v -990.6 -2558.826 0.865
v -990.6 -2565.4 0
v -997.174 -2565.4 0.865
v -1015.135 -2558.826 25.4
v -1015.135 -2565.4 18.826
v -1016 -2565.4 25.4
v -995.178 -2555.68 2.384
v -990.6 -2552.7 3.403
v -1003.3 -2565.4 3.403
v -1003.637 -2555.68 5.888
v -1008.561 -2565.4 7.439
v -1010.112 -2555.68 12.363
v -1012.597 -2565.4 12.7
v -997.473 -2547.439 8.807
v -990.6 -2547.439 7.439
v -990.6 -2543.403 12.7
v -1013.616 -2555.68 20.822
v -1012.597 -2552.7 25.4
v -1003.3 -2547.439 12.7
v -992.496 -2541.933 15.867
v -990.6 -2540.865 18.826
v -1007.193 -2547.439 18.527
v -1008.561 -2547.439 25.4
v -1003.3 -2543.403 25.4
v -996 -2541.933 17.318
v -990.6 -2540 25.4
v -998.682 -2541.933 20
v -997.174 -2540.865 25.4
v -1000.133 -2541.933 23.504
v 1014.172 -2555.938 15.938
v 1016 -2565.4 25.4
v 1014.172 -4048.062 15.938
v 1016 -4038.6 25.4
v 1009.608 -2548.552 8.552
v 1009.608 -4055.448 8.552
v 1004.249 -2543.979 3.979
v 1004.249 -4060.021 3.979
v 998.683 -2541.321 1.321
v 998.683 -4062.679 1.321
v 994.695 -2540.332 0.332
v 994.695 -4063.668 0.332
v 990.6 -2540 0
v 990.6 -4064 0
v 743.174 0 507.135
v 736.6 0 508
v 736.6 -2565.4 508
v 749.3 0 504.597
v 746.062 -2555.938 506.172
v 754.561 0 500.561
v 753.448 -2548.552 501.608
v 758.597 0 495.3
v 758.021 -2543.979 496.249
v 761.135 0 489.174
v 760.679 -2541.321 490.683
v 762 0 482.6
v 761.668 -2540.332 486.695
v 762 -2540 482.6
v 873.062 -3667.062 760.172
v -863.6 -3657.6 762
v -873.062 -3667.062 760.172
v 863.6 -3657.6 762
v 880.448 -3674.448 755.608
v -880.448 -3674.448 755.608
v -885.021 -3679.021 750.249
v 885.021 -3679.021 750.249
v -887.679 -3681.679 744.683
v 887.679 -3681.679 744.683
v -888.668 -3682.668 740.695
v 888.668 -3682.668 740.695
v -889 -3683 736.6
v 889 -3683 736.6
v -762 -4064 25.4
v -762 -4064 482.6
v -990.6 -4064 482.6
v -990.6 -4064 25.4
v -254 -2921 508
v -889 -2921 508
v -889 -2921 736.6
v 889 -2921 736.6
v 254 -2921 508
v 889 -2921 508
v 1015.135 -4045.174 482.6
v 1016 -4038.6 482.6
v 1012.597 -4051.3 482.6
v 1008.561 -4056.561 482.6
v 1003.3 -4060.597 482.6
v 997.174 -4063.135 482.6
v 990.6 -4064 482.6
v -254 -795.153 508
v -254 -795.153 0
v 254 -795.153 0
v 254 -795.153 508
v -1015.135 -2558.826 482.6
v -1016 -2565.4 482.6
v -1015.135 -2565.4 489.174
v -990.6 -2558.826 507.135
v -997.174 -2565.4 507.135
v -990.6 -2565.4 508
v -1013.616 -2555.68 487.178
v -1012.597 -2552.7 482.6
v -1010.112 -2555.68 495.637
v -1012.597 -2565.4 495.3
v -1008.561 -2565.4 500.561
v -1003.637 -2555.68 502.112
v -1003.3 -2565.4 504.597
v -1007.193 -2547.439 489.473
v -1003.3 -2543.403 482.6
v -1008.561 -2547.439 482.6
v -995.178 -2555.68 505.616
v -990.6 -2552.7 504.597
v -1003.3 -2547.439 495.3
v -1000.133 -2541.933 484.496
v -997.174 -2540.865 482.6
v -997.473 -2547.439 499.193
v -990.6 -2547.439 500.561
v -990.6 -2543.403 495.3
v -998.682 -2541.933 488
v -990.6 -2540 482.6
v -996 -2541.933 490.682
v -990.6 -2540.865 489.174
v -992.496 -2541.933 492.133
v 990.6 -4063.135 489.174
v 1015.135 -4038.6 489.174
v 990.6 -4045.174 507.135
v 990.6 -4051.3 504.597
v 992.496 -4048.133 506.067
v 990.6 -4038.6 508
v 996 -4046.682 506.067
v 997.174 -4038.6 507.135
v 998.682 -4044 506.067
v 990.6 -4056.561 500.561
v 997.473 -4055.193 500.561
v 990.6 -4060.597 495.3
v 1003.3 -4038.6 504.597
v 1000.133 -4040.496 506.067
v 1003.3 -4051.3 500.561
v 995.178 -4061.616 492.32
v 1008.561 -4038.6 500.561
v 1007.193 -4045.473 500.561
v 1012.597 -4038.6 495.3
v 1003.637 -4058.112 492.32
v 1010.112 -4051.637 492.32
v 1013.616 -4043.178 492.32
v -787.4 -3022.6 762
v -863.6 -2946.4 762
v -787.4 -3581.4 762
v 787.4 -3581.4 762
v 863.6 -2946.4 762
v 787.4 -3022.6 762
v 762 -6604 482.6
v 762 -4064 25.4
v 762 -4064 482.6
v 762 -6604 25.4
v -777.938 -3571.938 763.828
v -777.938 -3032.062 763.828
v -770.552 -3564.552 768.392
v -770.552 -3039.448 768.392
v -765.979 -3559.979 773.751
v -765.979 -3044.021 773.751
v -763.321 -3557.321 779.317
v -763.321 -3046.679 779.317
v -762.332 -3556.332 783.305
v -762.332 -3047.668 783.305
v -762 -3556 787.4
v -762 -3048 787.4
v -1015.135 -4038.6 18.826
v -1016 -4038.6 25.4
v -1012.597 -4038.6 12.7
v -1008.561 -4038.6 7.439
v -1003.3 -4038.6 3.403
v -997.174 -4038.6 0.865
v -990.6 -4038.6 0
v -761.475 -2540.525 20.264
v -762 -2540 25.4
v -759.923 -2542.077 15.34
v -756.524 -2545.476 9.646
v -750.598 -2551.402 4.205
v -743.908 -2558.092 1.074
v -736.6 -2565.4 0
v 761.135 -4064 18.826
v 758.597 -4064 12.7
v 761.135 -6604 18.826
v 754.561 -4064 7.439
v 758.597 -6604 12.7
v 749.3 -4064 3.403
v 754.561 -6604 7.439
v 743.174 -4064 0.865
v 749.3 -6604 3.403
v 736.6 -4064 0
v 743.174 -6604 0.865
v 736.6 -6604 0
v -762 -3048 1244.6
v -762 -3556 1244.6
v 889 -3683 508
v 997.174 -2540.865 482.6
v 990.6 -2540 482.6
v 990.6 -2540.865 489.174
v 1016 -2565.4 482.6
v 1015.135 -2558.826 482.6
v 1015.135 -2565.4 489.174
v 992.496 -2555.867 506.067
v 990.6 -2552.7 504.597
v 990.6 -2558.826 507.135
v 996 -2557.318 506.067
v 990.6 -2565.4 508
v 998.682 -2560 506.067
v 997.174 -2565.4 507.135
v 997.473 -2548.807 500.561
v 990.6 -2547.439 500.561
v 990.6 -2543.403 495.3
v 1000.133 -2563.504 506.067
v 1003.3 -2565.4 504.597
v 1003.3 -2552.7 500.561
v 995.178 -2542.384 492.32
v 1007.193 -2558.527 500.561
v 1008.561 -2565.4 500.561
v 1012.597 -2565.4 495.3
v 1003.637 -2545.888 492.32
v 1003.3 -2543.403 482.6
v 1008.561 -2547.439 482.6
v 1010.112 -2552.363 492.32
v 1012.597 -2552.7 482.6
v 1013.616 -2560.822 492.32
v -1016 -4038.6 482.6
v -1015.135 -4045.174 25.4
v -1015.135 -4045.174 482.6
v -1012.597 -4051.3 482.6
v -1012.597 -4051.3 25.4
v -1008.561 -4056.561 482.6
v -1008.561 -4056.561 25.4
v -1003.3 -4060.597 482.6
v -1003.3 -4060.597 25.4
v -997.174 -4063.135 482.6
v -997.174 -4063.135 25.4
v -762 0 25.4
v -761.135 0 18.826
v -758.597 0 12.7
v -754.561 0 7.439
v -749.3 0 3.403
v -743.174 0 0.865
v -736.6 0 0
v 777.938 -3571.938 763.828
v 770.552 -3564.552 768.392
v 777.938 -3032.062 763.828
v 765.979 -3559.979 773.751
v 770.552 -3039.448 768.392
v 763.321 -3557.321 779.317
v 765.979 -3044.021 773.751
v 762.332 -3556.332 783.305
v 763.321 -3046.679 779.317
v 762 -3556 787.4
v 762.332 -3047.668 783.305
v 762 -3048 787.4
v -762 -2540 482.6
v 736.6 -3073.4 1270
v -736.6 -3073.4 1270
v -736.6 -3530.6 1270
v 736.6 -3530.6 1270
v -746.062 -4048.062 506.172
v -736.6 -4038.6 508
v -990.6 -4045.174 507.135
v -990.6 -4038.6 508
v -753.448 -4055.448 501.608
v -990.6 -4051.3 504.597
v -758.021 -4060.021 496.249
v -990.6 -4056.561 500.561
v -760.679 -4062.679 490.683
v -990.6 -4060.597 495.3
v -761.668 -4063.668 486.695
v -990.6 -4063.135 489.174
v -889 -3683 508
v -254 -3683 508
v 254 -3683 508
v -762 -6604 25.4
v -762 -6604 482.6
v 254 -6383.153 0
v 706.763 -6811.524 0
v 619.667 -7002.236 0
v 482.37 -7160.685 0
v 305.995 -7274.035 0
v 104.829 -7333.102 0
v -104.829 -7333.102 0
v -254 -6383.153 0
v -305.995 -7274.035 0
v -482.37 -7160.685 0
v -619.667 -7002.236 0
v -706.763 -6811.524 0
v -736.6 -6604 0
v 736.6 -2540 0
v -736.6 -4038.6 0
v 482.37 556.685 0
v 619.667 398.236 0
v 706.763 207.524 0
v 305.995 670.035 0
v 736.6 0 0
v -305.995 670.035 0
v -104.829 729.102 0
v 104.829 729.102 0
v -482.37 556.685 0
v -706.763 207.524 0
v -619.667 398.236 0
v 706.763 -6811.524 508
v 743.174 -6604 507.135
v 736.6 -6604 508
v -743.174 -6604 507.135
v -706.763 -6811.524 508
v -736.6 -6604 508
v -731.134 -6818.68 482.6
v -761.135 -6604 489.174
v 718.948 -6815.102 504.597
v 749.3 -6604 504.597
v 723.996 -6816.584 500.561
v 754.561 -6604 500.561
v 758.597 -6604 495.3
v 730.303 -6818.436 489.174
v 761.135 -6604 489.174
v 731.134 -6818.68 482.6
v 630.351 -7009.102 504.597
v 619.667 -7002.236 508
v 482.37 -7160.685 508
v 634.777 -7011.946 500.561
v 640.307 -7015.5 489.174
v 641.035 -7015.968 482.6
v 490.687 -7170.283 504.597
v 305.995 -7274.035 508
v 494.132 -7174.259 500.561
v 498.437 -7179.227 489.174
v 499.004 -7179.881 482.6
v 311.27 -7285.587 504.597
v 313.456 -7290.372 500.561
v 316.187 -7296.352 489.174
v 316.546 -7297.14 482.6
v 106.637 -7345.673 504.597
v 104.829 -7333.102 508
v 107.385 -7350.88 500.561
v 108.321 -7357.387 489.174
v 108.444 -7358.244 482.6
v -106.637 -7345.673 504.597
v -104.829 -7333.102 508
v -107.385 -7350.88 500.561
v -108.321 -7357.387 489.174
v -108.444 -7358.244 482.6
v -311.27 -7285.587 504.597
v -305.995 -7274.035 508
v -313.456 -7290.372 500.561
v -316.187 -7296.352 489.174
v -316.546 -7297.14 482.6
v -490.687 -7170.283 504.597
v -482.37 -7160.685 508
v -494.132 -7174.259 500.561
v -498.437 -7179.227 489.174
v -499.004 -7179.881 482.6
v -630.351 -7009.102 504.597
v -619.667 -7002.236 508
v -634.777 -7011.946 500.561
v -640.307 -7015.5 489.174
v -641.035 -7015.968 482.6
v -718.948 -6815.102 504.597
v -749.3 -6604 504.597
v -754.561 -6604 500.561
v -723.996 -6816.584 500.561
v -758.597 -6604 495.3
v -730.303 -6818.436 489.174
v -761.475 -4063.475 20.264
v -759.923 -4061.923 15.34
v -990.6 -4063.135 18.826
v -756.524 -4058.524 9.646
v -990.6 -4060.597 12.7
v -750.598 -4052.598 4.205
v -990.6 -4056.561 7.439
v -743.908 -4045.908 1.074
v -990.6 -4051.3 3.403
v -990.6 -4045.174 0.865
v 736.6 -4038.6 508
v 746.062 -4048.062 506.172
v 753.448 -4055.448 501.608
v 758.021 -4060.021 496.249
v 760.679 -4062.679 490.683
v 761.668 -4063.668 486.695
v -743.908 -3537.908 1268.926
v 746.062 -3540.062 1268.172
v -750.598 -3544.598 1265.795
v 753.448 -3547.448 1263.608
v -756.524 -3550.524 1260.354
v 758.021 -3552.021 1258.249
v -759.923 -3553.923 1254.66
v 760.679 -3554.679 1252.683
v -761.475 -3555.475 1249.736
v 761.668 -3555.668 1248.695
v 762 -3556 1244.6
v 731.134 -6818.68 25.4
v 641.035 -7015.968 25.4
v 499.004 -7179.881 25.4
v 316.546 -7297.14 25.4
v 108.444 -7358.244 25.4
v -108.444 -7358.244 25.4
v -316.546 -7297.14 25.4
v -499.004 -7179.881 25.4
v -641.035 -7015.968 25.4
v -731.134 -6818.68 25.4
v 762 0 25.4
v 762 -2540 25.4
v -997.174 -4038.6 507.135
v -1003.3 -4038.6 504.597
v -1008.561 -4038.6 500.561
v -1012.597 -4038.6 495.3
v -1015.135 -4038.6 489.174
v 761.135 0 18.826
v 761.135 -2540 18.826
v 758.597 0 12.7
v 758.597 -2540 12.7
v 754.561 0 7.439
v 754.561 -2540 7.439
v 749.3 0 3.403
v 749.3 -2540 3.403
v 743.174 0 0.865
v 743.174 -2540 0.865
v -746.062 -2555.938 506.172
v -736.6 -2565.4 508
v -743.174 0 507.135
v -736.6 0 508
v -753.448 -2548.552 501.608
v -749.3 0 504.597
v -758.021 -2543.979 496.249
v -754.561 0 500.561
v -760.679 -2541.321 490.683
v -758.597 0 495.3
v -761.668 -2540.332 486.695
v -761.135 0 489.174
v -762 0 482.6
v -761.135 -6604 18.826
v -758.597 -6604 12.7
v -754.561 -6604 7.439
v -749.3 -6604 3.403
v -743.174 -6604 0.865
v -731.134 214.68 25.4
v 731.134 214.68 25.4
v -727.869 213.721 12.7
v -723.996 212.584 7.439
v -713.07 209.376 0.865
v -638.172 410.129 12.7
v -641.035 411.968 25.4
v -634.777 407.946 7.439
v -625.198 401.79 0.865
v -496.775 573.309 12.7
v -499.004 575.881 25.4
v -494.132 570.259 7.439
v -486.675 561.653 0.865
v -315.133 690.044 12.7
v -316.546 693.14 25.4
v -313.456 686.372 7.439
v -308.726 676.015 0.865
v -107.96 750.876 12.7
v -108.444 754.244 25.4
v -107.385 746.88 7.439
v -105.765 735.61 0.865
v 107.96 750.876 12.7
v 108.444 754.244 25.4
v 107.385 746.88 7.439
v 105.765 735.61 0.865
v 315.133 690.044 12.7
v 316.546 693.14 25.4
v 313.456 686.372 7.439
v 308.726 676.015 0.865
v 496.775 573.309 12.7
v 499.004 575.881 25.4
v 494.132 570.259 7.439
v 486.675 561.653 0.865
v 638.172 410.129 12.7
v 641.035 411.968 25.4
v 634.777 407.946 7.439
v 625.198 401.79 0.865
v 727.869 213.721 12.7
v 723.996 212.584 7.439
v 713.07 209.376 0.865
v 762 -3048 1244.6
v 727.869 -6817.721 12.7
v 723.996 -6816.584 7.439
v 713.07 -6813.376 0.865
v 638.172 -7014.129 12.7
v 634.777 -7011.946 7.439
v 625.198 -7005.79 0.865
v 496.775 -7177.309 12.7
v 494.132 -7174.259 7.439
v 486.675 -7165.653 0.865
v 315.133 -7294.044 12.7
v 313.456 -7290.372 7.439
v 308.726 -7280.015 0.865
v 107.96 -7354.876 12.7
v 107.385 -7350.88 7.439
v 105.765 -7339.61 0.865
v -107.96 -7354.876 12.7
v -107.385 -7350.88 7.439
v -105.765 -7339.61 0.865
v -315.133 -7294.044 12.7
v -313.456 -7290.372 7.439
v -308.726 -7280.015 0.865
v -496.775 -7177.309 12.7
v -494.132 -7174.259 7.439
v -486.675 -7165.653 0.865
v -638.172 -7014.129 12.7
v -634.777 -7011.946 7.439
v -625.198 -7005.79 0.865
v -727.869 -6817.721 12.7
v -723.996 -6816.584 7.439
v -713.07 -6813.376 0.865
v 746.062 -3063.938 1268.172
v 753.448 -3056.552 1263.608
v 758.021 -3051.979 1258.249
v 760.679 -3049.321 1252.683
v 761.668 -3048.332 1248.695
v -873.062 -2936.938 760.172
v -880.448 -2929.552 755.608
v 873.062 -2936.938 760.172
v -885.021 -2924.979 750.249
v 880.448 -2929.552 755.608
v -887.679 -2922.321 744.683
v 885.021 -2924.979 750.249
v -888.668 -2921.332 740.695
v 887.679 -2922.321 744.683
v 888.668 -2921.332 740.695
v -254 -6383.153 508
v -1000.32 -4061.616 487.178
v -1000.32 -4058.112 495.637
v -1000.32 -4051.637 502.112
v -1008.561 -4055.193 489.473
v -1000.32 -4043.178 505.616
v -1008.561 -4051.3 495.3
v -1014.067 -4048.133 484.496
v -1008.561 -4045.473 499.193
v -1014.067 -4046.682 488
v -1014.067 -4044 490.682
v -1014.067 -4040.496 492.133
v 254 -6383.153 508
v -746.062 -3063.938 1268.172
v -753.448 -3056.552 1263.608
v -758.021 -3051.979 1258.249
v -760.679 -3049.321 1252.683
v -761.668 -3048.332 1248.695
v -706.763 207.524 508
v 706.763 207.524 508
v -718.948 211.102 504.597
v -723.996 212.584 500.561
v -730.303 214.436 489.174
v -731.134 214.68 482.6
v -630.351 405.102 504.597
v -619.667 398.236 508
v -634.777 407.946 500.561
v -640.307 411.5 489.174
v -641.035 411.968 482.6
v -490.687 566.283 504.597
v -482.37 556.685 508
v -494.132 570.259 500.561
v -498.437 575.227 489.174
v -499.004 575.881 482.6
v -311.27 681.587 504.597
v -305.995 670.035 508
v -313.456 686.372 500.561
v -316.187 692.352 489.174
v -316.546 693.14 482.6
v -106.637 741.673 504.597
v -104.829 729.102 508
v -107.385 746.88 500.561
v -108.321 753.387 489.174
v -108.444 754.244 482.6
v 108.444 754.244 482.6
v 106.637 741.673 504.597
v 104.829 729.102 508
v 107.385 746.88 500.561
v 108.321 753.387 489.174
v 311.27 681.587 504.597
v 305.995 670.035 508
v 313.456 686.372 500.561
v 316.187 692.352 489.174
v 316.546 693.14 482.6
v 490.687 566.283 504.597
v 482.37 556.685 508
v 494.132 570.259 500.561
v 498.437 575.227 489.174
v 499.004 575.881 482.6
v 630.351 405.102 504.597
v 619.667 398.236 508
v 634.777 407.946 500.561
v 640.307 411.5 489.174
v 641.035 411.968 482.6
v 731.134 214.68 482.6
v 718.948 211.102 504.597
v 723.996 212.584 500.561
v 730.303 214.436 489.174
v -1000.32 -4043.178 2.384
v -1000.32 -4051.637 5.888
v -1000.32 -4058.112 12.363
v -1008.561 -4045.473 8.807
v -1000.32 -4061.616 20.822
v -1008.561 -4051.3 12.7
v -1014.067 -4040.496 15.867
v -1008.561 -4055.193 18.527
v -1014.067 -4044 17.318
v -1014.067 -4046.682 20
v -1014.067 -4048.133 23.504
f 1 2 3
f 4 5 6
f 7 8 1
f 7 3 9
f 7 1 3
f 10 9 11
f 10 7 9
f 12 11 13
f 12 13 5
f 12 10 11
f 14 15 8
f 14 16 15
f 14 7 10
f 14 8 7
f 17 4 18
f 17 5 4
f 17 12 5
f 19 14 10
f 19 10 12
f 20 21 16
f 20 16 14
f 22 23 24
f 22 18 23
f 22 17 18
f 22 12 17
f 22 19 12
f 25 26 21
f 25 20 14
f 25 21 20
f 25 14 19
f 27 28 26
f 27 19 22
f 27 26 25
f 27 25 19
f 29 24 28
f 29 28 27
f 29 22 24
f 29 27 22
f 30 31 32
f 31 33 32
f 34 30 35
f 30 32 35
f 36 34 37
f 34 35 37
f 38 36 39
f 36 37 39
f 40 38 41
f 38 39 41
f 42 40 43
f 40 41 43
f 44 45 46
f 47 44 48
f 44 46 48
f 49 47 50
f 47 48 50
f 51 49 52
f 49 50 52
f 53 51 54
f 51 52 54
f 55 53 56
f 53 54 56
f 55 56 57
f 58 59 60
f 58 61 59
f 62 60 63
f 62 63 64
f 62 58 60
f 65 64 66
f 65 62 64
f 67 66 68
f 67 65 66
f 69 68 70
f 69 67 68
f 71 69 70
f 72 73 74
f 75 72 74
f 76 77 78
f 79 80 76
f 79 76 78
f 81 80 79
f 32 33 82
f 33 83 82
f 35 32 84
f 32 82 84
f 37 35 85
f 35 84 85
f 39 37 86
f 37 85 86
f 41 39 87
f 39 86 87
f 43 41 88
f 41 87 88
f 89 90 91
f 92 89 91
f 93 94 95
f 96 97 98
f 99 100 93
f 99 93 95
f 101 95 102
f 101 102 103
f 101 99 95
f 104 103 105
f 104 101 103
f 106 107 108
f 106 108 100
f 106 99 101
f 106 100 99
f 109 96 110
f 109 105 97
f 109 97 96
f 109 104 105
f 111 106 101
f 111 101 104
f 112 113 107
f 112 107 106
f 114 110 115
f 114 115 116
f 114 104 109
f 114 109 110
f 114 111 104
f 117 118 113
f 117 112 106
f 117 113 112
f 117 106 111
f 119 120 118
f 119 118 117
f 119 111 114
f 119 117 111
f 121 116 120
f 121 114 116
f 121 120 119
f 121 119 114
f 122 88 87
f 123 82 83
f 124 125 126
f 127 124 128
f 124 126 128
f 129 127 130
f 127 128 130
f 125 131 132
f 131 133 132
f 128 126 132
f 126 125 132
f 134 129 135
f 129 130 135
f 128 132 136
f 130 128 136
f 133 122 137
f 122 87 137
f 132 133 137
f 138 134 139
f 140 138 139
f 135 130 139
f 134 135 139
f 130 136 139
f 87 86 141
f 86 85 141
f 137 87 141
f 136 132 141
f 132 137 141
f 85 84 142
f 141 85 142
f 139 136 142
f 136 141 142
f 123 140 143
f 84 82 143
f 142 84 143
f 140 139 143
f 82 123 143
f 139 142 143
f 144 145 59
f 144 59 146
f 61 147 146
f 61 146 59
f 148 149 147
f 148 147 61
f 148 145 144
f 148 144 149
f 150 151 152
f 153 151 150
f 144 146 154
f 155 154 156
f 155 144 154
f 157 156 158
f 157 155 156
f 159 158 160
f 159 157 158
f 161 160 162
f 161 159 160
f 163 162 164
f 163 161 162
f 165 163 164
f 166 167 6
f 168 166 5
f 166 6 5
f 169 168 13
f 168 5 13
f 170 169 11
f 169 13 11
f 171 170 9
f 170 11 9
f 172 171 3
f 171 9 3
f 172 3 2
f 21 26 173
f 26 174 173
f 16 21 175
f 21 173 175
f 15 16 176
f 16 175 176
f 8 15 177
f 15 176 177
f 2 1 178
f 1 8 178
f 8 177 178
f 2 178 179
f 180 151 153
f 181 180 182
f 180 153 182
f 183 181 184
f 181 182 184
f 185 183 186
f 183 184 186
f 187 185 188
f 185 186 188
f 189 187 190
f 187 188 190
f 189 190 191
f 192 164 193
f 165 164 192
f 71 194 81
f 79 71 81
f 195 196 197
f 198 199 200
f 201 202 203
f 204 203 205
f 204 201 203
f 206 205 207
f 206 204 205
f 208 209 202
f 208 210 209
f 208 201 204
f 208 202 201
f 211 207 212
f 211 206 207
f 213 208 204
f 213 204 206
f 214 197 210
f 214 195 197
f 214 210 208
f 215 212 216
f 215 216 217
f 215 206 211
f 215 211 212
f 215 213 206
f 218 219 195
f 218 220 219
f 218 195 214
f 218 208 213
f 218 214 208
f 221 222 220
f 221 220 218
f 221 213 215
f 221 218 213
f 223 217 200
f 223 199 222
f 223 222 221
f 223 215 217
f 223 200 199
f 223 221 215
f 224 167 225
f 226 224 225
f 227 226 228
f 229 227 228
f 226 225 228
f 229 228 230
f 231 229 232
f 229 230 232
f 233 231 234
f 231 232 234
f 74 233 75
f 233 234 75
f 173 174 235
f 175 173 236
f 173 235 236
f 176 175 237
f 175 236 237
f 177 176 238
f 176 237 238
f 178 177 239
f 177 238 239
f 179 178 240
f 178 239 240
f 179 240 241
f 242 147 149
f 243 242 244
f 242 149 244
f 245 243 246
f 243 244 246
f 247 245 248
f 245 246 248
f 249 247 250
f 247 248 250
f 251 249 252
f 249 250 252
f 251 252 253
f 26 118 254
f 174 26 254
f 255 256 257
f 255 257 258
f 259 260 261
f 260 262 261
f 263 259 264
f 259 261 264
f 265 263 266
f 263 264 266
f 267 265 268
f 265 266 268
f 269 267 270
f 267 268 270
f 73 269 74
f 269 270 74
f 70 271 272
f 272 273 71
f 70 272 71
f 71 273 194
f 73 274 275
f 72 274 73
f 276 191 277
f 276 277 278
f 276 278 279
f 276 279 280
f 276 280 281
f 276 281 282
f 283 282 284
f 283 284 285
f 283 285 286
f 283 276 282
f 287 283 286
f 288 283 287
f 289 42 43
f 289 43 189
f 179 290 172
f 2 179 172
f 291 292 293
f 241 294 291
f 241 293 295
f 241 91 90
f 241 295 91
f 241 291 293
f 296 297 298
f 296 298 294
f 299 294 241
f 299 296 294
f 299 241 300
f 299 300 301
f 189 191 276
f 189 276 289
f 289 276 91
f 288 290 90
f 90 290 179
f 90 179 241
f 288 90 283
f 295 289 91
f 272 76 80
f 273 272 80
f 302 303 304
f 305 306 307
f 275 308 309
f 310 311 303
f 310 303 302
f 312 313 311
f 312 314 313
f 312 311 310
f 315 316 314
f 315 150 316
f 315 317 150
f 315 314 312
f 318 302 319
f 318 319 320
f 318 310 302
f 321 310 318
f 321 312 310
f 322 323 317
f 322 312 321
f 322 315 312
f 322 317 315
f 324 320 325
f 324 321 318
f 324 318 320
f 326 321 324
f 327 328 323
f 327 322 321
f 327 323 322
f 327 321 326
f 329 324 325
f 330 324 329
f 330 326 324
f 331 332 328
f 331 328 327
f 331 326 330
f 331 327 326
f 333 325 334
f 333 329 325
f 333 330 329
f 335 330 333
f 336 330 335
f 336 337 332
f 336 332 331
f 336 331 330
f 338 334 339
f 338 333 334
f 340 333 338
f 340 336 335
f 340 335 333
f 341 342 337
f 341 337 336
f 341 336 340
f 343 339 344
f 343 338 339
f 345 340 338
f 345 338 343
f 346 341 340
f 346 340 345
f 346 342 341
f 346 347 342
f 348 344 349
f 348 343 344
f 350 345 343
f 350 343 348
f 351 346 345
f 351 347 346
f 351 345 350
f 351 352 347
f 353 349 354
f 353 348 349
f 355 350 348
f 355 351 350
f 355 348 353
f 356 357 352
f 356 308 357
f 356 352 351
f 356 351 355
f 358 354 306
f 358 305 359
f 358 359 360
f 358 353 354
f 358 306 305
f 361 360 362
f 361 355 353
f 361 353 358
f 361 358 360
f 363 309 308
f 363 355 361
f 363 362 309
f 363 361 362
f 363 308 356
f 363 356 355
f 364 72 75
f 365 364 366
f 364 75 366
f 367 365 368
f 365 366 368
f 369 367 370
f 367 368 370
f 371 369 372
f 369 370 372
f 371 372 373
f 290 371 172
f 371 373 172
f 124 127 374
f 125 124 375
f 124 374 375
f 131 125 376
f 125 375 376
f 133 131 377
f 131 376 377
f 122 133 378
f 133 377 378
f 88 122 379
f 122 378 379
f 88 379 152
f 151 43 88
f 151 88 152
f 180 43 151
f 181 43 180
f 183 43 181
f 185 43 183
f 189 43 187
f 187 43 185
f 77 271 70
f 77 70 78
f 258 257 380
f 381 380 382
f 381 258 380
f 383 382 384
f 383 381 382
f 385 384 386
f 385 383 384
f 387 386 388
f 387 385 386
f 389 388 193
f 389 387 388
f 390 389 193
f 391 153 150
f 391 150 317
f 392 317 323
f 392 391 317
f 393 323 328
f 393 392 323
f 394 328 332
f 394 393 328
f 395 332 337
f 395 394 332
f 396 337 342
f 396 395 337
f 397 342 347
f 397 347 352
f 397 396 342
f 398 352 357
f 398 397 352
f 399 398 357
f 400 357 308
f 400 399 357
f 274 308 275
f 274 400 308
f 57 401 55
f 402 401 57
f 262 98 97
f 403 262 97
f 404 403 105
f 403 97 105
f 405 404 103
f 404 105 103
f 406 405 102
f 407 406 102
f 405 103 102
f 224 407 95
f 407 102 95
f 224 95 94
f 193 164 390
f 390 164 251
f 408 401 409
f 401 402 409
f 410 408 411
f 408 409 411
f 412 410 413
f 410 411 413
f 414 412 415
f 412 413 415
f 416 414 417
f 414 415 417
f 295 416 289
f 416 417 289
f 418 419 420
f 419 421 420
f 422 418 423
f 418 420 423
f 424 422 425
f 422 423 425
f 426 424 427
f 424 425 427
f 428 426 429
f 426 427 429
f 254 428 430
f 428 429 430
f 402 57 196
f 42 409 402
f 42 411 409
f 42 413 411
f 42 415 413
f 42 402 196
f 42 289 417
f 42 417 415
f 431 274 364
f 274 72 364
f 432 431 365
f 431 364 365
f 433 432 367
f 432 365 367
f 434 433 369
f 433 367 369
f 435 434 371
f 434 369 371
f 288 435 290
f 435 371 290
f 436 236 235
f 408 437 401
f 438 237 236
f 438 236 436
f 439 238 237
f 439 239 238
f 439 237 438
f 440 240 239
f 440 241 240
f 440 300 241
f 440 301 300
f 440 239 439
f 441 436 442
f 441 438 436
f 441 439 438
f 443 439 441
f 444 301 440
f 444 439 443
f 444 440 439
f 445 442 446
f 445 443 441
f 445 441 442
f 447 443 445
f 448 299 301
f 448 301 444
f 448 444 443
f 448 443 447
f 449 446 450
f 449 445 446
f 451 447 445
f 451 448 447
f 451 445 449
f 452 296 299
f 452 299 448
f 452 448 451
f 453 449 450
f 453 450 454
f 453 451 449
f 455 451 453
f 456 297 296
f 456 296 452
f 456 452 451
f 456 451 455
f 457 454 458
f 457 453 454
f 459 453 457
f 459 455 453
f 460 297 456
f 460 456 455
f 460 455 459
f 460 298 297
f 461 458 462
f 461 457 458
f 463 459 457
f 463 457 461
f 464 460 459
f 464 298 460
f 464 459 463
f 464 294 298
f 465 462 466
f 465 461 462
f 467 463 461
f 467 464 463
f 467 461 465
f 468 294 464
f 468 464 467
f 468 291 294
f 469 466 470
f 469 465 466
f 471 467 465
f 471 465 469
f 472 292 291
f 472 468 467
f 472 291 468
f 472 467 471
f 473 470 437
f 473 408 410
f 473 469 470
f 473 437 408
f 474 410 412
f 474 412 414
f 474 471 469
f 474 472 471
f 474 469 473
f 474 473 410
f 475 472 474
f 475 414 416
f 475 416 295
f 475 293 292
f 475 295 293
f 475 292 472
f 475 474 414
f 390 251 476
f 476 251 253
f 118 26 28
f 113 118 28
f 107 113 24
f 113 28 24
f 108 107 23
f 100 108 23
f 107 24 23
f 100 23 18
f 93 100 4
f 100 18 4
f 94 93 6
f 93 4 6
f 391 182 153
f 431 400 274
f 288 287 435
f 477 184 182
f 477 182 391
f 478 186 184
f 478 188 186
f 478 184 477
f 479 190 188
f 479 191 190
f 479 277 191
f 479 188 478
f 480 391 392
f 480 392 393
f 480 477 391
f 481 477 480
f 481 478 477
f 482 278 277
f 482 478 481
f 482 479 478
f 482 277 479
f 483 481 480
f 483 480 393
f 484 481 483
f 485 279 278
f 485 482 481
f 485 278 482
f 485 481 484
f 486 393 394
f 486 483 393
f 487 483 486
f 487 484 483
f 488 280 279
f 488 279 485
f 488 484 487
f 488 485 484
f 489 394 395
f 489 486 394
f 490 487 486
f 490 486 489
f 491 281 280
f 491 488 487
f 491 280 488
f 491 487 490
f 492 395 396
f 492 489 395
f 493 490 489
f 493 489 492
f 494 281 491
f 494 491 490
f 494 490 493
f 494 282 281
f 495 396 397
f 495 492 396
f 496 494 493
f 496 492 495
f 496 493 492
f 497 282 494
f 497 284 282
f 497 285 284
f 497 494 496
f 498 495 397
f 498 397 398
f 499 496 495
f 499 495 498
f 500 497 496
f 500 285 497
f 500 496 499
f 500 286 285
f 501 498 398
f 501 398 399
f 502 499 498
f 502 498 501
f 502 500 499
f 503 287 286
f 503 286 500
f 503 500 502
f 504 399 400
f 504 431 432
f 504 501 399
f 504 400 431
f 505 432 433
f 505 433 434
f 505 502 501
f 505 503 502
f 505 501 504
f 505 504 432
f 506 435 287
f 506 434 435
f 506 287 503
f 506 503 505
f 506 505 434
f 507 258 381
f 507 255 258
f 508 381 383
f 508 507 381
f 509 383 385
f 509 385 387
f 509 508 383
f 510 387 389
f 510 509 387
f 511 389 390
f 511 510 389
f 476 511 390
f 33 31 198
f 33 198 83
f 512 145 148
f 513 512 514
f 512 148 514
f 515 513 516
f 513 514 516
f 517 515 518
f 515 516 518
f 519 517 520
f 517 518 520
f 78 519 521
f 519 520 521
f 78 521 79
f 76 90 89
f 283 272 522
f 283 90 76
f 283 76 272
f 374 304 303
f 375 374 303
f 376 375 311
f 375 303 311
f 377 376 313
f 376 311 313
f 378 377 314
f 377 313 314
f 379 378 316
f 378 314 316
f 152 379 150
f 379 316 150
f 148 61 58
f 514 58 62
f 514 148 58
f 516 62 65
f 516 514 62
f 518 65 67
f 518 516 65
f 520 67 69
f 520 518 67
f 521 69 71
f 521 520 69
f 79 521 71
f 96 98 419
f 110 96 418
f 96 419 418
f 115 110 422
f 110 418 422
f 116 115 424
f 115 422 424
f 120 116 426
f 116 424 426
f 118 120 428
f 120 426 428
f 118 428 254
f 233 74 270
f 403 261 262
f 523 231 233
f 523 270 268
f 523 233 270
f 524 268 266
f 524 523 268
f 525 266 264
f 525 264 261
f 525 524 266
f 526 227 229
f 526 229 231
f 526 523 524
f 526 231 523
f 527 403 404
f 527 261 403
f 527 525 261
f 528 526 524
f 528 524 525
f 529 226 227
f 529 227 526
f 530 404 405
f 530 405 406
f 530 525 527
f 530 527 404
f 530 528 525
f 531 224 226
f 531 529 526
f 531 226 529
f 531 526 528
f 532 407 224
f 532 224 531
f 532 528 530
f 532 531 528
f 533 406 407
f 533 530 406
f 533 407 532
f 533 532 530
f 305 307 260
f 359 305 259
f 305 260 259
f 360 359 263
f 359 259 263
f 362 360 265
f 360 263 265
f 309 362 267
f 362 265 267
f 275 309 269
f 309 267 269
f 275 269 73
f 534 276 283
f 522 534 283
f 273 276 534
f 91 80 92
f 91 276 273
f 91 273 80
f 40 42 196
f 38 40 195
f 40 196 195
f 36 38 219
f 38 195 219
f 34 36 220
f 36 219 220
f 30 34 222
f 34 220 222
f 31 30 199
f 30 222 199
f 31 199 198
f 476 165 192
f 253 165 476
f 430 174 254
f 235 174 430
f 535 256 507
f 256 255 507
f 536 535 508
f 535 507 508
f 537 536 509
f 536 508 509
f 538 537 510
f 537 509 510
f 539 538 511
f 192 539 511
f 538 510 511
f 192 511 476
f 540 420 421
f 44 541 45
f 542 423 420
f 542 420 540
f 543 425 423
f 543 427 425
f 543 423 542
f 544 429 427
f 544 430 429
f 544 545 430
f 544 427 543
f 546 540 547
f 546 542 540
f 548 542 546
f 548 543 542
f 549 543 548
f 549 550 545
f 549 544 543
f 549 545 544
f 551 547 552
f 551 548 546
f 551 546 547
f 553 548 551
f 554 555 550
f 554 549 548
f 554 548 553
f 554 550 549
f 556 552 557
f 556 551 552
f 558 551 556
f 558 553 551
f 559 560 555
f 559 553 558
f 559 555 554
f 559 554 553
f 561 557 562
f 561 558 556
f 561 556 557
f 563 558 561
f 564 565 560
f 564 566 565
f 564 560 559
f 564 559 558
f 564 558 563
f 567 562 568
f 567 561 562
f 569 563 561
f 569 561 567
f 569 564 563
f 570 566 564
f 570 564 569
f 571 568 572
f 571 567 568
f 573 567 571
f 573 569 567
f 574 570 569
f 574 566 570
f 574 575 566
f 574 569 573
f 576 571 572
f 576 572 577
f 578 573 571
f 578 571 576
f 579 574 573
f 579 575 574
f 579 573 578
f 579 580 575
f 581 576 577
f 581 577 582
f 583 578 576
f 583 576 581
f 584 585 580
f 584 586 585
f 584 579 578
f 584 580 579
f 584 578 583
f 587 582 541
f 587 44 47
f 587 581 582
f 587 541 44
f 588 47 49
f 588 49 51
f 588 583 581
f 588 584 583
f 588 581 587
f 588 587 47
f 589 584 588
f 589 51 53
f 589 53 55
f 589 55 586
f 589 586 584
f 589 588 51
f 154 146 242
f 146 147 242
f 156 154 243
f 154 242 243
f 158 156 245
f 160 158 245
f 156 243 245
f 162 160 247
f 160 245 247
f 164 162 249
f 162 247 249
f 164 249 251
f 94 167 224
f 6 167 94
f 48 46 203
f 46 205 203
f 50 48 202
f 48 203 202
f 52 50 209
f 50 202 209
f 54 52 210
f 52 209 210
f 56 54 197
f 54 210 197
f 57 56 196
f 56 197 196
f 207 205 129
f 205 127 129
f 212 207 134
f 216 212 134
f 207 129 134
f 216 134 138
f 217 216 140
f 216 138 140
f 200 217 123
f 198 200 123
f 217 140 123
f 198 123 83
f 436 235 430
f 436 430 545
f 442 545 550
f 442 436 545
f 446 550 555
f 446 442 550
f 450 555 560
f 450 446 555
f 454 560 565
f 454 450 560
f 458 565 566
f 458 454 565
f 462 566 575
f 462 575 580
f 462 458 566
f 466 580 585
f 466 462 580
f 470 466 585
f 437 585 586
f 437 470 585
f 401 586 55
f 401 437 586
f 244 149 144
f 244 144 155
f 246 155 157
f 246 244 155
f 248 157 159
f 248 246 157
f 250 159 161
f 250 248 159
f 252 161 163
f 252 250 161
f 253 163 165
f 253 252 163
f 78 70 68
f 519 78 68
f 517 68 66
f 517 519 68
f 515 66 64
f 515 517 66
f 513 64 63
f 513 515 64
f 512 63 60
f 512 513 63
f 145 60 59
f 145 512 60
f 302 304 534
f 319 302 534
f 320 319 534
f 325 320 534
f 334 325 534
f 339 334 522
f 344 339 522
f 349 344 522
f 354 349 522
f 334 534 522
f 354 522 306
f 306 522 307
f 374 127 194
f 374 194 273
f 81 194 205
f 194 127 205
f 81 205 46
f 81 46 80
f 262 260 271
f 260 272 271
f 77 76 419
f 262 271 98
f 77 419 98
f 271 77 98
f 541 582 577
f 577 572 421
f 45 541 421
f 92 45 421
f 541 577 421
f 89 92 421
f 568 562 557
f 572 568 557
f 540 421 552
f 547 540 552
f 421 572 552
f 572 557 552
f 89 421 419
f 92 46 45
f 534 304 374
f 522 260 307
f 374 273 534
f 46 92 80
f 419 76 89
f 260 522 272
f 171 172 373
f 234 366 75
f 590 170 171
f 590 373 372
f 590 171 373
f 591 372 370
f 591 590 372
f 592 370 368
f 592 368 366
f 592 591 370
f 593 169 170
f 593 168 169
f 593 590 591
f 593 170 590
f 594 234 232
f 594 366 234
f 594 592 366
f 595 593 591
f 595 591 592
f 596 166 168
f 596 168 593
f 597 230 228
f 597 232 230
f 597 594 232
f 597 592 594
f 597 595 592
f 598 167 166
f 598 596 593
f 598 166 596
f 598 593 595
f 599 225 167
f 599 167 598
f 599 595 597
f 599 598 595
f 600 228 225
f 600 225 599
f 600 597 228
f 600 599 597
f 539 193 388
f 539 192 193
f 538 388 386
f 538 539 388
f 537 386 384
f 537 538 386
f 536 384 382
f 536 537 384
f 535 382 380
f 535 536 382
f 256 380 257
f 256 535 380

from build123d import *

# Parameters (mm, degrees)
BOSS_EXTRUDE1_DEPTH = 508
SKETCH2_W           = 1524
SKETCH2_H           = 508
BOSS_EXTRUDE3_DEPTH = 762
SKETCH3_W           = 1778
SKETCH3_H           = 762
SKETCH3_W_2         = 1524
SKETCH3_H_2         = 508
BOSS_EXTRUDE4_DEPTH = 254
FILLET1_R           = 25.4
FILLET2_R           = 25.4
FILLET3_R           = 25.4


with BuildPart() as part:
    # Sketch1 → Boss-Extrude1 (new body)
    with BuildSketch(Plane.XY):
        with BuildLine():
            Line((762, 0), (762, -2540))
            Line((762, -2540), (1016, -2540))
            Line((1016, -2540), (1016, -4064))
            Line((1016, -4064), (762, -4064))
            Line((762, -4064), (762, -6604))
            ThreePointArc((762, -6604), (0, -7366), (-762, -6604))
            Line((-762, -6604), (-762, -4064))
            Line((-762, -4064), (-1016, -4064))
            Line((-1016, -4064), (-1016, -2540))
            Line((-1016, -2540), (-762, -2540))
            Line((-762, -2540), (-762, 0))
            ThreePointArc((-762, 0), (0, 762), (762, 0))
        make_face()
        Polygon((0, -795.153480501), (-254, -795.153480501), (-254, -6383.153480501), (0, -6383.153480501), (254, -6383.153480501), (254, -795.153480501), align=None, mode=Mode.SUBTRACT)
    extrude(amount=BOSS_EXTRUDE1_DEPTH)

    # Sketch2 → Boss-Extrude3 (add)
    with BuildSketch(Plane.XY.offset(508)):
        with Locations((0, -3302)):
            Rectangle(SKETCH2_W, SKETCH2_H)
    extrude(amount=BOSS_EXTRUDE3_DEPTH)

    # Sketch3 → Boss-Extrude4 (add)
    with BuildSketch(Plane.XY.offset(508)):
        with Locations((0, -3302)):
            Rectangle(SKETCH3_W, SKETCH3_H)
        with Locations((0, -3302)):
            Rectangle(SKETCH3_W_2, SKETCH3_H_2, mode=Mode.SUBTRACT)
    extrude(amount=BOSS_EXTRUDE4_DEPTH)

    # Fillet1
    fillet1_edges = [part.edges().sort_by_distance(p)[0] for p in [
        (762, -3302, 1270),
        (0, -3048, 1270),
        (-762, -3302, 1270),
        (0, -3556, 1270),
        (0, -3683, 762),
        (889, -3302, 762),
        (0, -2921, 762),
        (-889, -3302, 762),
        (0, -3556, 762),
        (762, -3302, 762),
        (0, -3048, 762),
        (-762, -3302, 762),
    ]]
    fillet(fillet1_edges, radius=FILLET1_R)

    # Fillet2
    fillet2_edges = [part.edges().sort_by_distance(p)[0] for p in [
        (1016, -4064, 254),
        (-889, -2540, 0),
        (-889, -2540, 508),
        (0, -7366, 508),
        (0, -7366, 0),
        (-762, -1270, 508),
        (-762, -1270, 0),
        (0, 762, 508),
        (0, 762, 0),
        (762, -1270, 0),
        (-889, -4064, 0),
        (-889, -4064, 508),
        (-1016, -3302, 508),
        (-1016, -3302, 0),
        (-762, -5334, 0),
        (-762, -5334, 508),
        (762, -5334, 0),
        (1016, -3302, 0),
        (1016, -2540, 254),
        (762, -1270, 508),
        (889, -2540, 508),
        (889, -4064, 508),
        (762, -5334, 508),
        (1016, -3302, 508),
    ]]
    fillet(fillet2_edges, radius=FILLET2_R)

    # Fillet3
    # the kernel refuses this fillet: 25.4 mm, written as the material it takes off along each edge
    with BuildSketch(Plane(origin=(-990.6, -2565.4, 482.6), x_dir=(-1, 0, 0), z_dir=(0, 1, 0))) as fillet3_piece_1_section:
        Polygon((0, 0), (FILLET3_R * 1.02, 0), (FILLET3_R * 1.02, FILLET3_R * 1.02), (0, FILLET3_R * 1.02), align=None)
    fillet3_piece_1 = extrude(amount=FILLET3_R * 1.02, mode=Mode.PRIVATE)
    fillet3_piece_1 = fillet3_piece_1 - Plane(origin=(-990.6, -2565.4, 482.6), x_dir=(0.7071067811865475, 0, -0.7071067811865475), z_dir=(0, 1, 0)) * Sphere(FILLET3_R, mode=Mode.PRIVATE)
    with BuildSketch(Plane(origin=(-990.6, -4038.6, 482.6), x_dir=(0, -1, 0), z_dir=(-1, 0, 0))) as fillet3_piece_2_section:
        Polygon((0, 0), (FILLET3_R * 1.02, 0), (FILLET3_R * 1.02, FILLET3_R * 1.02), (0, FILLET3_R * 1.02), align=None)
    fillet3_piece_2 = extrude(amount=FILLET3_R * 1.02, mode=Mode.PRIVATE)
    fillet3_piece_2 = fillet3_piece_2 - Plane(origin=(-990.6, -4038.6, 482.6), x_dir=(0, 0.7071067811865475, -0.7071067811865475), z_dir=(-1, 0, 0)) * Sphere(FILLET3_R, mode=Mode.PRIVATE)
    with BuildSketch(Plane(origin=(-990.6, -4038.6, 25.4), x_dir=(0, -1, 0), z_dir=(-1, 0, 0))) as fillet3_piece_3_section:
        Polygon((0, 0), (FILLET3_R * 1.02, 0), (FILLET3_R * 1.02, -FILLET3_R * 1.02), (0, -FILLET3_R * 1.02), align=None)
    fillet3_piece_3 = extrude(amount=FILLET3_R * 1.02, mode=Mode.PRIVATE)
    fillet3_piece_3 = fillet3_piece_3 - Plane(origin=(-990.6, -4038.6, 25.4), x_dir=(0, 0.7071067811865475, 0.7071067811865475), z_dir=(-1, 0, 0)) * Sphere(FILLET3_R, mode=Mode.PRIVATE)
    with BuildSketch(Plane(origin=(-990.6, -2565.4, 25.4), x_dir=(-1, 0, 0), z_dir=(0, 1, 0))) as fillet3_piece_4_section:
        Polygon((0, 0), (FILLET3_R * 1.02, 0), (FILLET3_R * 1.02, -FILLET3_R * 1.02), (0, -FILLET3_R * 1.02), align=None)
    fillet3_piece_4 = extrude(amount=FILLET3_R * 1.02, mode=Mode.PRIVATE)
    fillet3_piece_4 = fillet3_piece_4 - Plane(origin=(-990.6, -2565.4, 25.4), x_dir=(0.7071067811865475, 0, 0.7071067811865475), z_dir=(0, 1, 0)) * Sphere(FILLET3_R, mode=Mode.PRIVATE)
    with BuildSketch(Plane(origin=(-1016, -2540, 25.4), x_dir=(1, 0, 0), z_dir=(0, 0, 1)), Plane(origin=(-1016, -4064, 25.4), x_dir=(0, 1, 0), z_dir=(0, 0, 1))) as fillet3_piece_5:
        with BuildLine():
            CenterArc((FILLET3_R, -FILLET3_R), FILLET3_R, 90, 90)
            Line((0, -FILLET3_R), (0, 0))
            Line((0, 0), (FILLET3_R, 0))
        make_face()
    fillet3_piece_5_solid = extrude(amount=457.2, mode=Mode.PRIVATE)
    add([fillet3_piece_1, fillet3_piece_2, fillet3_piece_3, fillet3_piece_4, fillet3_piece_5_solid], mode=Mode.SUBTRACT)


solid = part.part
